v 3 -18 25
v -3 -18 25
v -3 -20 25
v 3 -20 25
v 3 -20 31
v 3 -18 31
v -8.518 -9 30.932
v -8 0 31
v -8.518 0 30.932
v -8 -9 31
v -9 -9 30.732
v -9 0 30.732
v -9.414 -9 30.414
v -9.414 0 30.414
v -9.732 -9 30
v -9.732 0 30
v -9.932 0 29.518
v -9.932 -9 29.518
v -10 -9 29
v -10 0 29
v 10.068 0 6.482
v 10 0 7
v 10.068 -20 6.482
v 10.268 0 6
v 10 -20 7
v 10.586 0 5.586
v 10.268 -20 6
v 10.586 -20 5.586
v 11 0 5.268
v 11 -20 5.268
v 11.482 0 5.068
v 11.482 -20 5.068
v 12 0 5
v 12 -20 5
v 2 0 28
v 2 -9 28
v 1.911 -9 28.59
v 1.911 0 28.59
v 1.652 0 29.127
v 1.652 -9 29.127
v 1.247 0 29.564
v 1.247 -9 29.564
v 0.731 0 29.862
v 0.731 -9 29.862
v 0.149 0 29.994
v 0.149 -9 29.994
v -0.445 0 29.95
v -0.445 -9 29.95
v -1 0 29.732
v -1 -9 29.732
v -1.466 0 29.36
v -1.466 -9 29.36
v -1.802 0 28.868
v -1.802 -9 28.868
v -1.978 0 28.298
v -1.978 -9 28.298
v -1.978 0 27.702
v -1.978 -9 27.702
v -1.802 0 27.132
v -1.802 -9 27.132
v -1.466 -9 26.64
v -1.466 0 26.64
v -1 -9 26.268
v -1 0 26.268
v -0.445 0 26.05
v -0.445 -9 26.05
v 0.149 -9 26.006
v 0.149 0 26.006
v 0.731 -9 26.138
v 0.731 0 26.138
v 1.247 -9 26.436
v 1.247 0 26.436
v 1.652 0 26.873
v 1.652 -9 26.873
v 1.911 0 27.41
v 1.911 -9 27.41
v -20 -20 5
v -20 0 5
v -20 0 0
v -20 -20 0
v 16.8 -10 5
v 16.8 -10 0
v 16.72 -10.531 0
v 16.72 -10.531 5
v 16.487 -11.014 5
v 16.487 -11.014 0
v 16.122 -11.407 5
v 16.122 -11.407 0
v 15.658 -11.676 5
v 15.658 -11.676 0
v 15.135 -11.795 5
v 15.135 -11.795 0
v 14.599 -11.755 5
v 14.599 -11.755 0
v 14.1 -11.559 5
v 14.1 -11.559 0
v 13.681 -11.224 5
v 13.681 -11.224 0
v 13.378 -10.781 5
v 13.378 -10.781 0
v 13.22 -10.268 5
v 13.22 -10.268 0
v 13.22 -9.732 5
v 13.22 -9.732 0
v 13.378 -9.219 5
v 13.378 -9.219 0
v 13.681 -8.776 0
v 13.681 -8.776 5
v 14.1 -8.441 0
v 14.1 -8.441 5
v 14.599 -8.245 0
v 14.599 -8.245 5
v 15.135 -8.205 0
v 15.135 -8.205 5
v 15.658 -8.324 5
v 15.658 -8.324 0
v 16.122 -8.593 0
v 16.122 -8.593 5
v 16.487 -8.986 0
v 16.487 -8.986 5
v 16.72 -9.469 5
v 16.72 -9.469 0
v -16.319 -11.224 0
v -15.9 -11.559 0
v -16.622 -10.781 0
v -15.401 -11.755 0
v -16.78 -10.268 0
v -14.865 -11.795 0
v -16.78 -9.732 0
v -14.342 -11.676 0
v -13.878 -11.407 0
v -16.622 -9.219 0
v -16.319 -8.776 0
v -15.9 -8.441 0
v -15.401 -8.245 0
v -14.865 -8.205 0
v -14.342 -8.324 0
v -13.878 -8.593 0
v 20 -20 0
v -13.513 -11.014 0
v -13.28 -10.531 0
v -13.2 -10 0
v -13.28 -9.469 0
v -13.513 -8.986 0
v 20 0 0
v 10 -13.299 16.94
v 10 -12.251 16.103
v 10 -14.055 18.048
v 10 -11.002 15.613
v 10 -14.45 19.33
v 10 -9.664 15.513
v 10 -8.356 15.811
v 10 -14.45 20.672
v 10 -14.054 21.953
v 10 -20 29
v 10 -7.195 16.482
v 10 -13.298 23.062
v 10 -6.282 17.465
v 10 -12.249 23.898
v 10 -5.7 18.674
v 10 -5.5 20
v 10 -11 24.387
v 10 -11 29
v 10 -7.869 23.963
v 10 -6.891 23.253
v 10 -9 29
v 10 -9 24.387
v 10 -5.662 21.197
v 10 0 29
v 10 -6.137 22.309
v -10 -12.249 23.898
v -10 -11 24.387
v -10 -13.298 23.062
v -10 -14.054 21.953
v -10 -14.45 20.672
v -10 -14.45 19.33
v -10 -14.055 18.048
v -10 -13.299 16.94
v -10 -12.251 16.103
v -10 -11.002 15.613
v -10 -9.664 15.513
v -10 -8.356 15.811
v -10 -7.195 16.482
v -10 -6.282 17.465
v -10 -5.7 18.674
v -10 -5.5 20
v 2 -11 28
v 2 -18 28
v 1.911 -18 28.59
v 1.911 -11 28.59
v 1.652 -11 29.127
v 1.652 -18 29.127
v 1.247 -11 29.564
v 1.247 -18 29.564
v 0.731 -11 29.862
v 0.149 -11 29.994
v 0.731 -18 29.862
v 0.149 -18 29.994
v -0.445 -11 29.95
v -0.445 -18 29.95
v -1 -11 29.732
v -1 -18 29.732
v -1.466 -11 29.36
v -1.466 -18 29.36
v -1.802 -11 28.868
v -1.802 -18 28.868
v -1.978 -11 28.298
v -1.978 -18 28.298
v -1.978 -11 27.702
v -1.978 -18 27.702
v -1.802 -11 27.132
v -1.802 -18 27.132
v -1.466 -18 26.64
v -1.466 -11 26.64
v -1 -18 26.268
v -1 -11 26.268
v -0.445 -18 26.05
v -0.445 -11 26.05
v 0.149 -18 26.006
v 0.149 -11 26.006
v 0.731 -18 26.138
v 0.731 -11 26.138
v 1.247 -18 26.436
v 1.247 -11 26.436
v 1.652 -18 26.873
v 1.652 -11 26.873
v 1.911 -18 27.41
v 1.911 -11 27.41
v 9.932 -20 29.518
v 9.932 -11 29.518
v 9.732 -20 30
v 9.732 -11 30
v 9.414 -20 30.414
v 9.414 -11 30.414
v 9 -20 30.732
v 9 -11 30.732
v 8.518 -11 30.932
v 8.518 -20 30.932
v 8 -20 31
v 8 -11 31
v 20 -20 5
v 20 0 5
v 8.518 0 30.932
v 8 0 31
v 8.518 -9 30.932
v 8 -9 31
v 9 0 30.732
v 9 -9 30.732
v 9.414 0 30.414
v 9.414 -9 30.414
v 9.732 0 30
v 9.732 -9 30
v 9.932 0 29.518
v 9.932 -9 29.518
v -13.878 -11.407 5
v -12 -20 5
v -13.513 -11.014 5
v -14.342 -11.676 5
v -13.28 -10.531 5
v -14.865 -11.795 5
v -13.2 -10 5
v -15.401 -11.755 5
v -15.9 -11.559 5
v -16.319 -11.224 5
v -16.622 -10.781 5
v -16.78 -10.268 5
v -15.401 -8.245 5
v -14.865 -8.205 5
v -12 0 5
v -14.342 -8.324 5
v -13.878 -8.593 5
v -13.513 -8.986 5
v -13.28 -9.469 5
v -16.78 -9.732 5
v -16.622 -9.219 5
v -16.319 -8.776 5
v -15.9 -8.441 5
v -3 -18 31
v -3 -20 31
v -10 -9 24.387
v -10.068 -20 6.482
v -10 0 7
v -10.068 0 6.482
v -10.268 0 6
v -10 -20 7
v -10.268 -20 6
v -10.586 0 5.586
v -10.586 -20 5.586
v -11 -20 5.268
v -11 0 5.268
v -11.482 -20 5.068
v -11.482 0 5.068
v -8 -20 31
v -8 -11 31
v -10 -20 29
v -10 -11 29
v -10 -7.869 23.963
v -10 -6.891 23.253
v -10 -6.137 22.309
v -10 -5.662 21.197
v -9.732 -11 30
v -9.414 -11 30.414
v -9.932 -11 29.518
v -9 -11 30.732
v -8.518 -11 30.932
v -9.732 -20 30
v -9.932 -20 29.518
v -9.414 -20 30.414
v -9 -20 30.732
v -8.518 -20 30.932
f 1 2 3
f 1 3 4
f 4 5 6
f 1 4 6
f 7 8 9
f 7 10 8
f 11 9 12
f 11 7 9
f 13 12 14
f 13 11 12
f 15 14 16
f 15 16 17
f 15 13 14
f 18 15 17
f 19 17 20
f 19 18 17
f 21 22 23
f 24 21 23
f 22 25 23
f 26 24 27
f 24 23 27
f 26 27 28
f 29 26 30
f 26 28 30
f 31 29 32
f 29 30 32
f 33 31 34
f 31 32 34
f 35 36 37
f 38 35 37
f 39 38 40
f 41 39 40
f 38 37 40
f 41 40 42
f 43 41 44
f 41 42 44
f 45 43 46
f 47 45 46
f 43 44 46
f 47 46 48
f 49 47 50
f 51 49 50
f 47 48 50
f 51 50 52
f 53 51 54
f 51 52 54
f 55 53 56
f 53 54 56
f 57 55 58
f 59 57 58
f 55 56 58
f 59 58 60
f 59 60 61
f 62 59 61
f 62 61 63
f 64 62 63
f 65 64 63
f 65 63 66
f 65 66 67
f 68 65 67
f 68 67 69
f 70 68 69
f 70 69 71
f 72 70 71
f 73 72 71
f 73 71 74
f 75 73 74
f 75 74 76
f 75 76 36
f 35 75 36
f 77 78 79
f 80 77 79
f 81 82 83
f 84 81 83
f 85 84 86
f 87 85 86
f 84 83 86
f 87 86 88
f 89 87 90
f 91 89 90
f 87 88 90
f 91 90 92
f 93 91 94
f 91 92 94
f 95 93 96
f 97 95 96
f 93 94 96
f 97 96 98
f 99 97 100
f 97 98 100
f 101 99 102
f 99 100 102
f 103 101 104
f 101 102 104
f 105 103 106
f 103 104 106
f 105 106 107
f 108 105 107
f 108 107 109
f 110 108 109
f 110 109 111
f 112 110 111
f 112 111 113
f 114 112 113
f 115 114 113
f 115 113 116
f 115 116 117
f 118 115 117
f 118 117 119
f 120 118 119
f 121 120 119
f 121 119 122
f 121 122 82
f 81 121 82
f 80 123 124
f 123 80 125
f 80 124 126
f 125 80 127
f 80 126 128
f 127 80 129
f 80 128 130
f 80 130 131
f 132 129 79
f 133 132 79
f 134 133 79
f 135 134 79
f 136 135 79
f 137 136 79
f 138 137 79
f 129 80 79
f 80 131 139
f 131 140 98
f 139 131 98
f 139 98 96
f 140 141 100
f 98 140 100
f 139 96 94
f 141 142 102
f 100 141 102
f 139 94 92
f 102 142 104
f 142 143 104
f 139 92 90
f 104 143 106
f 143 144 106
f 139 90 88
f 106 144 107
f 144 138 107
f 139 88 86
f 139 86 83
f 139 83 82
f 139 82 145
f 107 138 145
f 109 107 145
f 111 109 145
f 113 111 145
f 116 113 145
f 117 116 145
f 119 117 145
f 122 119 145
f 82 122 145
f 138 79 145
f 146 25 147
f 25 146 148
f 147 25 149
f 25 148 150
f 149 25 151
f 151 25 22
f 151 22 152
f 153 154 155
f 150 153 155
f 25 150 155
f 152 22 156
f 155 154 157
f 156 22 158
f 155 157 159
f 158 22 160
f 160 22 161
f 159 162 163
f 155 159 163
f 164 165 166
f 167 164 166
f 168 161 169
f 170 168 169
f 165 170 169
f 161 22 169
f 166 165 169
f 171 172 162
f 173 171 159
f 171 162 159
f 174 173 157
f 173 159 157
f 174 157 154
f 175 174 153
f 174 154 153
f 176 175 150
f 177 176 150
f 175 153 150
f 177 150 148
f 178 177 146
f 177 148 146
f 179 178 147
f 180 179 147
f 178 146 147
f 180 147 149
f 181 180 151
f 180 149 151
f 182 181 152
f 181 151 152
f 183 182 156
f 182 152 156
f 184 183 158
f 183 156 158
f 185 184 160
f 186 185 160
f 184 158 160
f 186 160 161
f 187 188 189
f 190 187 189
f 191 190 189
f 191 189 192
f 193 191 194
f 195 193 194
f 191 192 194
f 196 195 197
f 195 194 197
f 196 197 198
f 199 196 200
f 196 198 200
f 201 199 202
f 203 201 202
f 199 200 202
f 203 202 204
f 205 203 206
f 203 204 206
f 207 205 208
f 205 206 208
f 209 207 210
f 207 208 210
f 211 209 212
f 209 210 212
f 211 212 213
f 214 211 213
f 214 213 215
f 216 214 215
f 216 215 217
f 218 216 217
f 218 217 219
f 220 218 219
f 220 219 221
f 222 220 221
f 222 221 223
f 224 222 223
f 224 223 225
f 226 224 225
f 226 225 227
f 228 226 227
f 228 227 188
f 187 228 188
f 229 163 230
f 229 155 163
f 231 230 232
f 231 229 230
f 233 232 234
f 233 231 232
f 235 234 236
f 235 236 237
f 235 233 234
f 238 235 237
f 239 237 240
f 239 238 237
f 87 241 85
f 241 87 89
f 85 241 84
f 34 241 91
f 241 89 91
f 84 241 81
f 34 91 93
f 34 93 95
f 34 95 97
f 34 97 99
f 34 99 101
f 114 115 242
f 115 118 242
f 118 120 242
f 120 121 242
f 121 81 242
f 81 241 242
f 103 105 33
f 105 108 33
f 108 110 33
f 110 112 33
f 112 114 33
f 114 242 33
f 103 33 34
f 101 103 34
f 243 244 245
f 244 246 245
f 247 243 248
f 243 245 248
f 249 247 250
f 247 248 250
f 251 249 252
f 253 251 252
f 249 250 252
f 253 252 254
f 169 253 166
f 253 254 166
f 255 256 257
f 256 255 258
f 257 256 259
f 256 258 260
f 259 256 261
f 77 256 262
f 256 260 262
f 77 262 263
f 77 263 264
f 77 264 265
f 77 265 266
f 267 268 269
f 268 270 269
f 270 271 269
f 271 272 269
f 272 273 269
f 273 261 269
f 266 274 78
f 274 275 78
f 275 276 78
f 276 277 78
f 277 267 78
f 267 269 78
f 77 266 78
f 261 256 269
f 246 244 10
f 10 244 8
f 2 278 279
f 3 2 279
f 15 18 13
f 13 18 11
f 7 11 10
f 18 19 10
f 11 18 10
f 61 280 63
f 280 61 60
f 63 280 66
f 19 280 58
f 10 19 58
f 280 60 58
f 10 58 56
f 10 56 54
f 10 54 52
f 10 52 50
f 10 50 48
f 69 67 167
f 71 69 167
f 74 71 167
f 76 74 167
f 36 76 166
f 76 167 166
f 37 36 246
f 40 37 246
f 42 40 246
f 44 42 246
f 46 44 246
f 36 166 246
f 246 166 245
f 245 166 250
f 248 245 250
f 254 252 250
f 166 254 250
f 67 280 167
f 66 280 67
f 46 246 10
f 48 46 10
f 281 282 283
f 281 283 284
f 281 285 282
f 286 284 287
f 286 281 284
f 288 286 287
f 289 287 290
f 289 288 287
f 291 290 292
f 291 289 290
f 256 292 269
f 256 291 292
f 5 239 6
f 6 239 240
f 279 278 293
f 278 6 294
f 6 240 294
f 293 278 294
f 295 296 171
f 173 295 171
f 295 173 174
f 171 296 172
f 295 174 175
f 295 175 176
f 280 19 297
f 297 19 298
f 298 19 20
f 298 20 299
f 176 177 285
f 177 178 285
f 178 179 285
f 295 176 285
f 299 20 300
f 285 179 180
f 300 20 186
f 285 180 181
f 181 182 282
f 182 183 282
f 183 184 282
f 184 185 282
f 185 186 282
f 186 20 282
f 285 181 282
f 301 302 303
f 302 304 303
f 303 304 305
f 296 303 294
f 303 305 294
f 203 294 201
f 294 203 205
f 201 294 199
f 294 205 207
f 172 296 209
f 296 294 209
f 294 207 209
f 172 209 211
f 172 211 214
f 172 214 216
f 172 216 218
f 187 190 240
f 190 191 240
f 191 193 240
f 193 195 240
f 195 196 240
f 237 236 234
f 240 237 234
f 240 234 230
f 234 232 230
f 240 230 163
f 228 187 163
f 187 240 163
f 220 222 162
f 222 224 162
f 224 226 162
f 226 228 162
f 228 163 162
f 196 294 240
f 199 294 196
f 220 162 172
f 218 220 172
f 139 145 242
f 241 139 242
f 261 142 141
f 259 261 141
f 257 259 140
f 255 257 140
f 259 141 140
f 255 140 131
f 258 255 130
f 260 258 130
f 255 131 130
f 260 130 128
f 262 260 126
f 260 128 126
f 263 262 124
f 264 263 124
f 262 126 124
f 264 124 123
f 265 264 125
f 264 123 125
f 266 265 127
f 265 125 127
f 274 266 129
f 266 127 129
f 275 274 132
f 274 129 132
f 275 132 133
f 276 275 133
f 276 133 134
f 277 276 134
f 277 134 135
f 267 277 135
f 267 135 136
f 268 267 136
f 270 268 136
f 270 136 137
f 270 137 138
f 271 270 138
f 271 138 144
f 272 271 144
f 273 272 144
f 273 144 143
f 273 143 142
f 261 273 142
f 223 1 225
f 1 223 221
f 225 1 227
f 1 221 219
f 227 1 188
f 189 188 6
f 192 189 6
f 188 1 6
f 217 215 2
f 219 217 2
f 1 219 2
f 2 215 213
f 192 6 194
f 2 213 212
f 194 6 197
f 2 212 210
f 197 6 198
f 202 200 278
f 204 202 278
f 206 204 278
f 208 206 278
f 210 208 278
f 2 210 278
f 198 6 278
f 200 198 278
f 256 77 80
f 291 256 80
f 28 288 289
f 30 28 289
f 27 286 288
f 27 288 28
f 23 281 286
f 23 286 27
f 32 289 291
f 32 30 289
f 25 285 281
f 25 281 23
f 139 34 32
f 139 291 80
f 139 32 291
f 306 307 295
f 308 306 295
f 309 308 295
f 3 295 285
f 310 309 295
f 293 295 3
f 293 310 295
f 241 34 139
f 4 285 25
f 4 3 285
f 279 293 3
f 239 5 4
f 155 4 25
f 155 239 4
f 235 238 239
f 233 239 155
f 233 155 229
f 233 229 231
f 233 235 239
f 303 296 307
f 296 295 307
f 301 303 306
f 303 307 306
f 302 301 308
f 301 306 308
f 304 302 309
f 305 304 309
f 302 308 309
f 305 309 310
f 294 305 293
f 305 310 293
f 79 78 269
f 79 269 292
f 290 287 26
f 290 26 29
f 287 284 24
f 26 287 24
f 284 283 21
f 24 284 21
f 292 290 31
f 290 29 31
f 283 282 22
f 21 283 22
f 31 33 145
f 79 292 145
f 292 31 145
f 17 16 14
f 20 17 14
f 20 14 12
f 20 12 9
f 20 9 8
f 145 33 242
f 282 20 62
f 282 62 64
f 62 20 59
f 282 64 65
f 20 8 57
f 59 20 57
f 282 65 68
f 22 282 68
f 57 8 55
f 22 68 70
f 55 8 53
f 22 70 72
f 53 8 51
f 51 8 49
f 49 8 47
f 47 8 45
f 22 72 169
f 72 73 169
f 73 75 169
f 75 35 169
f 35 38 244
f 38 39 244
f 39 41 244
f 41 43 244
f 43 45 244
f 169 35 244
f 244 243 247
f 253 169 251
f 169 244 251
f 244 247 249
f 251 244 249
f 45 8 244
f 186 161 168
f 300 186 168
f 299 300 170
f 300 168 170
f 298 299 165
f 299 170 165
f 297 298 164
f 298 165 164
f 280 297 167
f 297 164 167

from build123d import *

# Parameters (mm, degrees)
F1_DEPTH = 20
F2_R     = 1.8
F3_DEPTH = 25
F5_DEPTH = 25
F7_DEPTH = 6
F8_R     = 2
F9_DEPTH = 25
F10_R    = 2


with BuildPart() as f1:
    # F0 (on Front) → F1 (new body)
    with BuildSketch(Plane.XZ):
        Polygon((10, 31), (-10, 31), (-10, 5), (-20, 5), (-20, 0), (20, 0), (20, 5), (10, 5), align=None)
    extrude(amount=F1_DEPTH)

    # F2 (on face) → F3 (cut)
    with BuildSketch(Plane(origin=(0, 0, 0), x_dir=(1, 0, 0), z_dir=(0, 0, -1))):
        with Locations((-15, 10)):
            Circle(F2_R)
        with Locations((15, 10)):
            Circle(F2_R)
    extrude(amount=-F3_DEPTH, mode=Mode.SUBTRACT)

    # F4 (on face) → F5 (cut)
    with BuildSketch(Plane.YZ.offset(10)):
        with BuildLine():
            ThreePointArc((-11, 24.3874821937), (-12.8062430401, 16.4821881801), (-5.5, 20))
            ThreePointArc((-5.5, 20), (-6.4821881801, 22.8062430401), (-9, 24.3874821937))
            Line((-9, 24.3874821937), (-9, 20))
            Line((-9, 20), (-10, 20))
            Line((-10, 20), (-11, 20))
            Line((-11, 20), (-11, 24.3874821937))
        make_face()
        with BuildLine():
            ThreePointArc((-11, 24.3874821937), (-10, 24.5), (-9, 24.3874821937))
            Line((-9, 24.3874821937), (-9, 31))
            Line((-9, 31), (-11, 31))
            Line((-11, 31), (-11, 24.3874821937))
        make_face()
        with BuildLine():
            Line((-9, 20), (-9, 24.3874821937))
            ThreePointArc((-9, 24.3874821937), (-10, 24.5), (-11, 24.3874821937))
            Line((-11, 24.3874821937), (-11, 20))
            Line((-11, 20), (-10, 20))
            Line((-10, 20), (-9, 20))
        make_face()
    extrude(amount=-F5_DEPTH, mode=Mode.SUBTRACT)

    # F6 (on face) → F7 (cut)
    with BuildSketch(Plane.XY.offset(31)):
        Polygon((-3, -18), (-3, -20), (3, -20), (3, -18), (0, -18), align=None)
    extrude(amount=-F7_DEPTH, mode=Mode.SUBTRACT)

    # F8 (on face) → F9 (cut)
    with BuildSketch(Plane.XZ.offset(18)):
        with Locations((0, 28)):
            Circle(F8_R)
    extrude(amount=-F9_DEPTH, mode=Mode.SUBTRACT)

    # F10
    f10_edges = [f1.edges().sort_by_distance(p)[0] for p in [
        (10, -15.5, 31),
        (10, -4.5, 31),
        (-10, -4.5, 31),
        (-10, -15.5, 31),
        (10, -10, 5),
        (-10, -10, 5),
    ]]
    fillet(f10_edges, radius=F10_R)


solid = f1.part
